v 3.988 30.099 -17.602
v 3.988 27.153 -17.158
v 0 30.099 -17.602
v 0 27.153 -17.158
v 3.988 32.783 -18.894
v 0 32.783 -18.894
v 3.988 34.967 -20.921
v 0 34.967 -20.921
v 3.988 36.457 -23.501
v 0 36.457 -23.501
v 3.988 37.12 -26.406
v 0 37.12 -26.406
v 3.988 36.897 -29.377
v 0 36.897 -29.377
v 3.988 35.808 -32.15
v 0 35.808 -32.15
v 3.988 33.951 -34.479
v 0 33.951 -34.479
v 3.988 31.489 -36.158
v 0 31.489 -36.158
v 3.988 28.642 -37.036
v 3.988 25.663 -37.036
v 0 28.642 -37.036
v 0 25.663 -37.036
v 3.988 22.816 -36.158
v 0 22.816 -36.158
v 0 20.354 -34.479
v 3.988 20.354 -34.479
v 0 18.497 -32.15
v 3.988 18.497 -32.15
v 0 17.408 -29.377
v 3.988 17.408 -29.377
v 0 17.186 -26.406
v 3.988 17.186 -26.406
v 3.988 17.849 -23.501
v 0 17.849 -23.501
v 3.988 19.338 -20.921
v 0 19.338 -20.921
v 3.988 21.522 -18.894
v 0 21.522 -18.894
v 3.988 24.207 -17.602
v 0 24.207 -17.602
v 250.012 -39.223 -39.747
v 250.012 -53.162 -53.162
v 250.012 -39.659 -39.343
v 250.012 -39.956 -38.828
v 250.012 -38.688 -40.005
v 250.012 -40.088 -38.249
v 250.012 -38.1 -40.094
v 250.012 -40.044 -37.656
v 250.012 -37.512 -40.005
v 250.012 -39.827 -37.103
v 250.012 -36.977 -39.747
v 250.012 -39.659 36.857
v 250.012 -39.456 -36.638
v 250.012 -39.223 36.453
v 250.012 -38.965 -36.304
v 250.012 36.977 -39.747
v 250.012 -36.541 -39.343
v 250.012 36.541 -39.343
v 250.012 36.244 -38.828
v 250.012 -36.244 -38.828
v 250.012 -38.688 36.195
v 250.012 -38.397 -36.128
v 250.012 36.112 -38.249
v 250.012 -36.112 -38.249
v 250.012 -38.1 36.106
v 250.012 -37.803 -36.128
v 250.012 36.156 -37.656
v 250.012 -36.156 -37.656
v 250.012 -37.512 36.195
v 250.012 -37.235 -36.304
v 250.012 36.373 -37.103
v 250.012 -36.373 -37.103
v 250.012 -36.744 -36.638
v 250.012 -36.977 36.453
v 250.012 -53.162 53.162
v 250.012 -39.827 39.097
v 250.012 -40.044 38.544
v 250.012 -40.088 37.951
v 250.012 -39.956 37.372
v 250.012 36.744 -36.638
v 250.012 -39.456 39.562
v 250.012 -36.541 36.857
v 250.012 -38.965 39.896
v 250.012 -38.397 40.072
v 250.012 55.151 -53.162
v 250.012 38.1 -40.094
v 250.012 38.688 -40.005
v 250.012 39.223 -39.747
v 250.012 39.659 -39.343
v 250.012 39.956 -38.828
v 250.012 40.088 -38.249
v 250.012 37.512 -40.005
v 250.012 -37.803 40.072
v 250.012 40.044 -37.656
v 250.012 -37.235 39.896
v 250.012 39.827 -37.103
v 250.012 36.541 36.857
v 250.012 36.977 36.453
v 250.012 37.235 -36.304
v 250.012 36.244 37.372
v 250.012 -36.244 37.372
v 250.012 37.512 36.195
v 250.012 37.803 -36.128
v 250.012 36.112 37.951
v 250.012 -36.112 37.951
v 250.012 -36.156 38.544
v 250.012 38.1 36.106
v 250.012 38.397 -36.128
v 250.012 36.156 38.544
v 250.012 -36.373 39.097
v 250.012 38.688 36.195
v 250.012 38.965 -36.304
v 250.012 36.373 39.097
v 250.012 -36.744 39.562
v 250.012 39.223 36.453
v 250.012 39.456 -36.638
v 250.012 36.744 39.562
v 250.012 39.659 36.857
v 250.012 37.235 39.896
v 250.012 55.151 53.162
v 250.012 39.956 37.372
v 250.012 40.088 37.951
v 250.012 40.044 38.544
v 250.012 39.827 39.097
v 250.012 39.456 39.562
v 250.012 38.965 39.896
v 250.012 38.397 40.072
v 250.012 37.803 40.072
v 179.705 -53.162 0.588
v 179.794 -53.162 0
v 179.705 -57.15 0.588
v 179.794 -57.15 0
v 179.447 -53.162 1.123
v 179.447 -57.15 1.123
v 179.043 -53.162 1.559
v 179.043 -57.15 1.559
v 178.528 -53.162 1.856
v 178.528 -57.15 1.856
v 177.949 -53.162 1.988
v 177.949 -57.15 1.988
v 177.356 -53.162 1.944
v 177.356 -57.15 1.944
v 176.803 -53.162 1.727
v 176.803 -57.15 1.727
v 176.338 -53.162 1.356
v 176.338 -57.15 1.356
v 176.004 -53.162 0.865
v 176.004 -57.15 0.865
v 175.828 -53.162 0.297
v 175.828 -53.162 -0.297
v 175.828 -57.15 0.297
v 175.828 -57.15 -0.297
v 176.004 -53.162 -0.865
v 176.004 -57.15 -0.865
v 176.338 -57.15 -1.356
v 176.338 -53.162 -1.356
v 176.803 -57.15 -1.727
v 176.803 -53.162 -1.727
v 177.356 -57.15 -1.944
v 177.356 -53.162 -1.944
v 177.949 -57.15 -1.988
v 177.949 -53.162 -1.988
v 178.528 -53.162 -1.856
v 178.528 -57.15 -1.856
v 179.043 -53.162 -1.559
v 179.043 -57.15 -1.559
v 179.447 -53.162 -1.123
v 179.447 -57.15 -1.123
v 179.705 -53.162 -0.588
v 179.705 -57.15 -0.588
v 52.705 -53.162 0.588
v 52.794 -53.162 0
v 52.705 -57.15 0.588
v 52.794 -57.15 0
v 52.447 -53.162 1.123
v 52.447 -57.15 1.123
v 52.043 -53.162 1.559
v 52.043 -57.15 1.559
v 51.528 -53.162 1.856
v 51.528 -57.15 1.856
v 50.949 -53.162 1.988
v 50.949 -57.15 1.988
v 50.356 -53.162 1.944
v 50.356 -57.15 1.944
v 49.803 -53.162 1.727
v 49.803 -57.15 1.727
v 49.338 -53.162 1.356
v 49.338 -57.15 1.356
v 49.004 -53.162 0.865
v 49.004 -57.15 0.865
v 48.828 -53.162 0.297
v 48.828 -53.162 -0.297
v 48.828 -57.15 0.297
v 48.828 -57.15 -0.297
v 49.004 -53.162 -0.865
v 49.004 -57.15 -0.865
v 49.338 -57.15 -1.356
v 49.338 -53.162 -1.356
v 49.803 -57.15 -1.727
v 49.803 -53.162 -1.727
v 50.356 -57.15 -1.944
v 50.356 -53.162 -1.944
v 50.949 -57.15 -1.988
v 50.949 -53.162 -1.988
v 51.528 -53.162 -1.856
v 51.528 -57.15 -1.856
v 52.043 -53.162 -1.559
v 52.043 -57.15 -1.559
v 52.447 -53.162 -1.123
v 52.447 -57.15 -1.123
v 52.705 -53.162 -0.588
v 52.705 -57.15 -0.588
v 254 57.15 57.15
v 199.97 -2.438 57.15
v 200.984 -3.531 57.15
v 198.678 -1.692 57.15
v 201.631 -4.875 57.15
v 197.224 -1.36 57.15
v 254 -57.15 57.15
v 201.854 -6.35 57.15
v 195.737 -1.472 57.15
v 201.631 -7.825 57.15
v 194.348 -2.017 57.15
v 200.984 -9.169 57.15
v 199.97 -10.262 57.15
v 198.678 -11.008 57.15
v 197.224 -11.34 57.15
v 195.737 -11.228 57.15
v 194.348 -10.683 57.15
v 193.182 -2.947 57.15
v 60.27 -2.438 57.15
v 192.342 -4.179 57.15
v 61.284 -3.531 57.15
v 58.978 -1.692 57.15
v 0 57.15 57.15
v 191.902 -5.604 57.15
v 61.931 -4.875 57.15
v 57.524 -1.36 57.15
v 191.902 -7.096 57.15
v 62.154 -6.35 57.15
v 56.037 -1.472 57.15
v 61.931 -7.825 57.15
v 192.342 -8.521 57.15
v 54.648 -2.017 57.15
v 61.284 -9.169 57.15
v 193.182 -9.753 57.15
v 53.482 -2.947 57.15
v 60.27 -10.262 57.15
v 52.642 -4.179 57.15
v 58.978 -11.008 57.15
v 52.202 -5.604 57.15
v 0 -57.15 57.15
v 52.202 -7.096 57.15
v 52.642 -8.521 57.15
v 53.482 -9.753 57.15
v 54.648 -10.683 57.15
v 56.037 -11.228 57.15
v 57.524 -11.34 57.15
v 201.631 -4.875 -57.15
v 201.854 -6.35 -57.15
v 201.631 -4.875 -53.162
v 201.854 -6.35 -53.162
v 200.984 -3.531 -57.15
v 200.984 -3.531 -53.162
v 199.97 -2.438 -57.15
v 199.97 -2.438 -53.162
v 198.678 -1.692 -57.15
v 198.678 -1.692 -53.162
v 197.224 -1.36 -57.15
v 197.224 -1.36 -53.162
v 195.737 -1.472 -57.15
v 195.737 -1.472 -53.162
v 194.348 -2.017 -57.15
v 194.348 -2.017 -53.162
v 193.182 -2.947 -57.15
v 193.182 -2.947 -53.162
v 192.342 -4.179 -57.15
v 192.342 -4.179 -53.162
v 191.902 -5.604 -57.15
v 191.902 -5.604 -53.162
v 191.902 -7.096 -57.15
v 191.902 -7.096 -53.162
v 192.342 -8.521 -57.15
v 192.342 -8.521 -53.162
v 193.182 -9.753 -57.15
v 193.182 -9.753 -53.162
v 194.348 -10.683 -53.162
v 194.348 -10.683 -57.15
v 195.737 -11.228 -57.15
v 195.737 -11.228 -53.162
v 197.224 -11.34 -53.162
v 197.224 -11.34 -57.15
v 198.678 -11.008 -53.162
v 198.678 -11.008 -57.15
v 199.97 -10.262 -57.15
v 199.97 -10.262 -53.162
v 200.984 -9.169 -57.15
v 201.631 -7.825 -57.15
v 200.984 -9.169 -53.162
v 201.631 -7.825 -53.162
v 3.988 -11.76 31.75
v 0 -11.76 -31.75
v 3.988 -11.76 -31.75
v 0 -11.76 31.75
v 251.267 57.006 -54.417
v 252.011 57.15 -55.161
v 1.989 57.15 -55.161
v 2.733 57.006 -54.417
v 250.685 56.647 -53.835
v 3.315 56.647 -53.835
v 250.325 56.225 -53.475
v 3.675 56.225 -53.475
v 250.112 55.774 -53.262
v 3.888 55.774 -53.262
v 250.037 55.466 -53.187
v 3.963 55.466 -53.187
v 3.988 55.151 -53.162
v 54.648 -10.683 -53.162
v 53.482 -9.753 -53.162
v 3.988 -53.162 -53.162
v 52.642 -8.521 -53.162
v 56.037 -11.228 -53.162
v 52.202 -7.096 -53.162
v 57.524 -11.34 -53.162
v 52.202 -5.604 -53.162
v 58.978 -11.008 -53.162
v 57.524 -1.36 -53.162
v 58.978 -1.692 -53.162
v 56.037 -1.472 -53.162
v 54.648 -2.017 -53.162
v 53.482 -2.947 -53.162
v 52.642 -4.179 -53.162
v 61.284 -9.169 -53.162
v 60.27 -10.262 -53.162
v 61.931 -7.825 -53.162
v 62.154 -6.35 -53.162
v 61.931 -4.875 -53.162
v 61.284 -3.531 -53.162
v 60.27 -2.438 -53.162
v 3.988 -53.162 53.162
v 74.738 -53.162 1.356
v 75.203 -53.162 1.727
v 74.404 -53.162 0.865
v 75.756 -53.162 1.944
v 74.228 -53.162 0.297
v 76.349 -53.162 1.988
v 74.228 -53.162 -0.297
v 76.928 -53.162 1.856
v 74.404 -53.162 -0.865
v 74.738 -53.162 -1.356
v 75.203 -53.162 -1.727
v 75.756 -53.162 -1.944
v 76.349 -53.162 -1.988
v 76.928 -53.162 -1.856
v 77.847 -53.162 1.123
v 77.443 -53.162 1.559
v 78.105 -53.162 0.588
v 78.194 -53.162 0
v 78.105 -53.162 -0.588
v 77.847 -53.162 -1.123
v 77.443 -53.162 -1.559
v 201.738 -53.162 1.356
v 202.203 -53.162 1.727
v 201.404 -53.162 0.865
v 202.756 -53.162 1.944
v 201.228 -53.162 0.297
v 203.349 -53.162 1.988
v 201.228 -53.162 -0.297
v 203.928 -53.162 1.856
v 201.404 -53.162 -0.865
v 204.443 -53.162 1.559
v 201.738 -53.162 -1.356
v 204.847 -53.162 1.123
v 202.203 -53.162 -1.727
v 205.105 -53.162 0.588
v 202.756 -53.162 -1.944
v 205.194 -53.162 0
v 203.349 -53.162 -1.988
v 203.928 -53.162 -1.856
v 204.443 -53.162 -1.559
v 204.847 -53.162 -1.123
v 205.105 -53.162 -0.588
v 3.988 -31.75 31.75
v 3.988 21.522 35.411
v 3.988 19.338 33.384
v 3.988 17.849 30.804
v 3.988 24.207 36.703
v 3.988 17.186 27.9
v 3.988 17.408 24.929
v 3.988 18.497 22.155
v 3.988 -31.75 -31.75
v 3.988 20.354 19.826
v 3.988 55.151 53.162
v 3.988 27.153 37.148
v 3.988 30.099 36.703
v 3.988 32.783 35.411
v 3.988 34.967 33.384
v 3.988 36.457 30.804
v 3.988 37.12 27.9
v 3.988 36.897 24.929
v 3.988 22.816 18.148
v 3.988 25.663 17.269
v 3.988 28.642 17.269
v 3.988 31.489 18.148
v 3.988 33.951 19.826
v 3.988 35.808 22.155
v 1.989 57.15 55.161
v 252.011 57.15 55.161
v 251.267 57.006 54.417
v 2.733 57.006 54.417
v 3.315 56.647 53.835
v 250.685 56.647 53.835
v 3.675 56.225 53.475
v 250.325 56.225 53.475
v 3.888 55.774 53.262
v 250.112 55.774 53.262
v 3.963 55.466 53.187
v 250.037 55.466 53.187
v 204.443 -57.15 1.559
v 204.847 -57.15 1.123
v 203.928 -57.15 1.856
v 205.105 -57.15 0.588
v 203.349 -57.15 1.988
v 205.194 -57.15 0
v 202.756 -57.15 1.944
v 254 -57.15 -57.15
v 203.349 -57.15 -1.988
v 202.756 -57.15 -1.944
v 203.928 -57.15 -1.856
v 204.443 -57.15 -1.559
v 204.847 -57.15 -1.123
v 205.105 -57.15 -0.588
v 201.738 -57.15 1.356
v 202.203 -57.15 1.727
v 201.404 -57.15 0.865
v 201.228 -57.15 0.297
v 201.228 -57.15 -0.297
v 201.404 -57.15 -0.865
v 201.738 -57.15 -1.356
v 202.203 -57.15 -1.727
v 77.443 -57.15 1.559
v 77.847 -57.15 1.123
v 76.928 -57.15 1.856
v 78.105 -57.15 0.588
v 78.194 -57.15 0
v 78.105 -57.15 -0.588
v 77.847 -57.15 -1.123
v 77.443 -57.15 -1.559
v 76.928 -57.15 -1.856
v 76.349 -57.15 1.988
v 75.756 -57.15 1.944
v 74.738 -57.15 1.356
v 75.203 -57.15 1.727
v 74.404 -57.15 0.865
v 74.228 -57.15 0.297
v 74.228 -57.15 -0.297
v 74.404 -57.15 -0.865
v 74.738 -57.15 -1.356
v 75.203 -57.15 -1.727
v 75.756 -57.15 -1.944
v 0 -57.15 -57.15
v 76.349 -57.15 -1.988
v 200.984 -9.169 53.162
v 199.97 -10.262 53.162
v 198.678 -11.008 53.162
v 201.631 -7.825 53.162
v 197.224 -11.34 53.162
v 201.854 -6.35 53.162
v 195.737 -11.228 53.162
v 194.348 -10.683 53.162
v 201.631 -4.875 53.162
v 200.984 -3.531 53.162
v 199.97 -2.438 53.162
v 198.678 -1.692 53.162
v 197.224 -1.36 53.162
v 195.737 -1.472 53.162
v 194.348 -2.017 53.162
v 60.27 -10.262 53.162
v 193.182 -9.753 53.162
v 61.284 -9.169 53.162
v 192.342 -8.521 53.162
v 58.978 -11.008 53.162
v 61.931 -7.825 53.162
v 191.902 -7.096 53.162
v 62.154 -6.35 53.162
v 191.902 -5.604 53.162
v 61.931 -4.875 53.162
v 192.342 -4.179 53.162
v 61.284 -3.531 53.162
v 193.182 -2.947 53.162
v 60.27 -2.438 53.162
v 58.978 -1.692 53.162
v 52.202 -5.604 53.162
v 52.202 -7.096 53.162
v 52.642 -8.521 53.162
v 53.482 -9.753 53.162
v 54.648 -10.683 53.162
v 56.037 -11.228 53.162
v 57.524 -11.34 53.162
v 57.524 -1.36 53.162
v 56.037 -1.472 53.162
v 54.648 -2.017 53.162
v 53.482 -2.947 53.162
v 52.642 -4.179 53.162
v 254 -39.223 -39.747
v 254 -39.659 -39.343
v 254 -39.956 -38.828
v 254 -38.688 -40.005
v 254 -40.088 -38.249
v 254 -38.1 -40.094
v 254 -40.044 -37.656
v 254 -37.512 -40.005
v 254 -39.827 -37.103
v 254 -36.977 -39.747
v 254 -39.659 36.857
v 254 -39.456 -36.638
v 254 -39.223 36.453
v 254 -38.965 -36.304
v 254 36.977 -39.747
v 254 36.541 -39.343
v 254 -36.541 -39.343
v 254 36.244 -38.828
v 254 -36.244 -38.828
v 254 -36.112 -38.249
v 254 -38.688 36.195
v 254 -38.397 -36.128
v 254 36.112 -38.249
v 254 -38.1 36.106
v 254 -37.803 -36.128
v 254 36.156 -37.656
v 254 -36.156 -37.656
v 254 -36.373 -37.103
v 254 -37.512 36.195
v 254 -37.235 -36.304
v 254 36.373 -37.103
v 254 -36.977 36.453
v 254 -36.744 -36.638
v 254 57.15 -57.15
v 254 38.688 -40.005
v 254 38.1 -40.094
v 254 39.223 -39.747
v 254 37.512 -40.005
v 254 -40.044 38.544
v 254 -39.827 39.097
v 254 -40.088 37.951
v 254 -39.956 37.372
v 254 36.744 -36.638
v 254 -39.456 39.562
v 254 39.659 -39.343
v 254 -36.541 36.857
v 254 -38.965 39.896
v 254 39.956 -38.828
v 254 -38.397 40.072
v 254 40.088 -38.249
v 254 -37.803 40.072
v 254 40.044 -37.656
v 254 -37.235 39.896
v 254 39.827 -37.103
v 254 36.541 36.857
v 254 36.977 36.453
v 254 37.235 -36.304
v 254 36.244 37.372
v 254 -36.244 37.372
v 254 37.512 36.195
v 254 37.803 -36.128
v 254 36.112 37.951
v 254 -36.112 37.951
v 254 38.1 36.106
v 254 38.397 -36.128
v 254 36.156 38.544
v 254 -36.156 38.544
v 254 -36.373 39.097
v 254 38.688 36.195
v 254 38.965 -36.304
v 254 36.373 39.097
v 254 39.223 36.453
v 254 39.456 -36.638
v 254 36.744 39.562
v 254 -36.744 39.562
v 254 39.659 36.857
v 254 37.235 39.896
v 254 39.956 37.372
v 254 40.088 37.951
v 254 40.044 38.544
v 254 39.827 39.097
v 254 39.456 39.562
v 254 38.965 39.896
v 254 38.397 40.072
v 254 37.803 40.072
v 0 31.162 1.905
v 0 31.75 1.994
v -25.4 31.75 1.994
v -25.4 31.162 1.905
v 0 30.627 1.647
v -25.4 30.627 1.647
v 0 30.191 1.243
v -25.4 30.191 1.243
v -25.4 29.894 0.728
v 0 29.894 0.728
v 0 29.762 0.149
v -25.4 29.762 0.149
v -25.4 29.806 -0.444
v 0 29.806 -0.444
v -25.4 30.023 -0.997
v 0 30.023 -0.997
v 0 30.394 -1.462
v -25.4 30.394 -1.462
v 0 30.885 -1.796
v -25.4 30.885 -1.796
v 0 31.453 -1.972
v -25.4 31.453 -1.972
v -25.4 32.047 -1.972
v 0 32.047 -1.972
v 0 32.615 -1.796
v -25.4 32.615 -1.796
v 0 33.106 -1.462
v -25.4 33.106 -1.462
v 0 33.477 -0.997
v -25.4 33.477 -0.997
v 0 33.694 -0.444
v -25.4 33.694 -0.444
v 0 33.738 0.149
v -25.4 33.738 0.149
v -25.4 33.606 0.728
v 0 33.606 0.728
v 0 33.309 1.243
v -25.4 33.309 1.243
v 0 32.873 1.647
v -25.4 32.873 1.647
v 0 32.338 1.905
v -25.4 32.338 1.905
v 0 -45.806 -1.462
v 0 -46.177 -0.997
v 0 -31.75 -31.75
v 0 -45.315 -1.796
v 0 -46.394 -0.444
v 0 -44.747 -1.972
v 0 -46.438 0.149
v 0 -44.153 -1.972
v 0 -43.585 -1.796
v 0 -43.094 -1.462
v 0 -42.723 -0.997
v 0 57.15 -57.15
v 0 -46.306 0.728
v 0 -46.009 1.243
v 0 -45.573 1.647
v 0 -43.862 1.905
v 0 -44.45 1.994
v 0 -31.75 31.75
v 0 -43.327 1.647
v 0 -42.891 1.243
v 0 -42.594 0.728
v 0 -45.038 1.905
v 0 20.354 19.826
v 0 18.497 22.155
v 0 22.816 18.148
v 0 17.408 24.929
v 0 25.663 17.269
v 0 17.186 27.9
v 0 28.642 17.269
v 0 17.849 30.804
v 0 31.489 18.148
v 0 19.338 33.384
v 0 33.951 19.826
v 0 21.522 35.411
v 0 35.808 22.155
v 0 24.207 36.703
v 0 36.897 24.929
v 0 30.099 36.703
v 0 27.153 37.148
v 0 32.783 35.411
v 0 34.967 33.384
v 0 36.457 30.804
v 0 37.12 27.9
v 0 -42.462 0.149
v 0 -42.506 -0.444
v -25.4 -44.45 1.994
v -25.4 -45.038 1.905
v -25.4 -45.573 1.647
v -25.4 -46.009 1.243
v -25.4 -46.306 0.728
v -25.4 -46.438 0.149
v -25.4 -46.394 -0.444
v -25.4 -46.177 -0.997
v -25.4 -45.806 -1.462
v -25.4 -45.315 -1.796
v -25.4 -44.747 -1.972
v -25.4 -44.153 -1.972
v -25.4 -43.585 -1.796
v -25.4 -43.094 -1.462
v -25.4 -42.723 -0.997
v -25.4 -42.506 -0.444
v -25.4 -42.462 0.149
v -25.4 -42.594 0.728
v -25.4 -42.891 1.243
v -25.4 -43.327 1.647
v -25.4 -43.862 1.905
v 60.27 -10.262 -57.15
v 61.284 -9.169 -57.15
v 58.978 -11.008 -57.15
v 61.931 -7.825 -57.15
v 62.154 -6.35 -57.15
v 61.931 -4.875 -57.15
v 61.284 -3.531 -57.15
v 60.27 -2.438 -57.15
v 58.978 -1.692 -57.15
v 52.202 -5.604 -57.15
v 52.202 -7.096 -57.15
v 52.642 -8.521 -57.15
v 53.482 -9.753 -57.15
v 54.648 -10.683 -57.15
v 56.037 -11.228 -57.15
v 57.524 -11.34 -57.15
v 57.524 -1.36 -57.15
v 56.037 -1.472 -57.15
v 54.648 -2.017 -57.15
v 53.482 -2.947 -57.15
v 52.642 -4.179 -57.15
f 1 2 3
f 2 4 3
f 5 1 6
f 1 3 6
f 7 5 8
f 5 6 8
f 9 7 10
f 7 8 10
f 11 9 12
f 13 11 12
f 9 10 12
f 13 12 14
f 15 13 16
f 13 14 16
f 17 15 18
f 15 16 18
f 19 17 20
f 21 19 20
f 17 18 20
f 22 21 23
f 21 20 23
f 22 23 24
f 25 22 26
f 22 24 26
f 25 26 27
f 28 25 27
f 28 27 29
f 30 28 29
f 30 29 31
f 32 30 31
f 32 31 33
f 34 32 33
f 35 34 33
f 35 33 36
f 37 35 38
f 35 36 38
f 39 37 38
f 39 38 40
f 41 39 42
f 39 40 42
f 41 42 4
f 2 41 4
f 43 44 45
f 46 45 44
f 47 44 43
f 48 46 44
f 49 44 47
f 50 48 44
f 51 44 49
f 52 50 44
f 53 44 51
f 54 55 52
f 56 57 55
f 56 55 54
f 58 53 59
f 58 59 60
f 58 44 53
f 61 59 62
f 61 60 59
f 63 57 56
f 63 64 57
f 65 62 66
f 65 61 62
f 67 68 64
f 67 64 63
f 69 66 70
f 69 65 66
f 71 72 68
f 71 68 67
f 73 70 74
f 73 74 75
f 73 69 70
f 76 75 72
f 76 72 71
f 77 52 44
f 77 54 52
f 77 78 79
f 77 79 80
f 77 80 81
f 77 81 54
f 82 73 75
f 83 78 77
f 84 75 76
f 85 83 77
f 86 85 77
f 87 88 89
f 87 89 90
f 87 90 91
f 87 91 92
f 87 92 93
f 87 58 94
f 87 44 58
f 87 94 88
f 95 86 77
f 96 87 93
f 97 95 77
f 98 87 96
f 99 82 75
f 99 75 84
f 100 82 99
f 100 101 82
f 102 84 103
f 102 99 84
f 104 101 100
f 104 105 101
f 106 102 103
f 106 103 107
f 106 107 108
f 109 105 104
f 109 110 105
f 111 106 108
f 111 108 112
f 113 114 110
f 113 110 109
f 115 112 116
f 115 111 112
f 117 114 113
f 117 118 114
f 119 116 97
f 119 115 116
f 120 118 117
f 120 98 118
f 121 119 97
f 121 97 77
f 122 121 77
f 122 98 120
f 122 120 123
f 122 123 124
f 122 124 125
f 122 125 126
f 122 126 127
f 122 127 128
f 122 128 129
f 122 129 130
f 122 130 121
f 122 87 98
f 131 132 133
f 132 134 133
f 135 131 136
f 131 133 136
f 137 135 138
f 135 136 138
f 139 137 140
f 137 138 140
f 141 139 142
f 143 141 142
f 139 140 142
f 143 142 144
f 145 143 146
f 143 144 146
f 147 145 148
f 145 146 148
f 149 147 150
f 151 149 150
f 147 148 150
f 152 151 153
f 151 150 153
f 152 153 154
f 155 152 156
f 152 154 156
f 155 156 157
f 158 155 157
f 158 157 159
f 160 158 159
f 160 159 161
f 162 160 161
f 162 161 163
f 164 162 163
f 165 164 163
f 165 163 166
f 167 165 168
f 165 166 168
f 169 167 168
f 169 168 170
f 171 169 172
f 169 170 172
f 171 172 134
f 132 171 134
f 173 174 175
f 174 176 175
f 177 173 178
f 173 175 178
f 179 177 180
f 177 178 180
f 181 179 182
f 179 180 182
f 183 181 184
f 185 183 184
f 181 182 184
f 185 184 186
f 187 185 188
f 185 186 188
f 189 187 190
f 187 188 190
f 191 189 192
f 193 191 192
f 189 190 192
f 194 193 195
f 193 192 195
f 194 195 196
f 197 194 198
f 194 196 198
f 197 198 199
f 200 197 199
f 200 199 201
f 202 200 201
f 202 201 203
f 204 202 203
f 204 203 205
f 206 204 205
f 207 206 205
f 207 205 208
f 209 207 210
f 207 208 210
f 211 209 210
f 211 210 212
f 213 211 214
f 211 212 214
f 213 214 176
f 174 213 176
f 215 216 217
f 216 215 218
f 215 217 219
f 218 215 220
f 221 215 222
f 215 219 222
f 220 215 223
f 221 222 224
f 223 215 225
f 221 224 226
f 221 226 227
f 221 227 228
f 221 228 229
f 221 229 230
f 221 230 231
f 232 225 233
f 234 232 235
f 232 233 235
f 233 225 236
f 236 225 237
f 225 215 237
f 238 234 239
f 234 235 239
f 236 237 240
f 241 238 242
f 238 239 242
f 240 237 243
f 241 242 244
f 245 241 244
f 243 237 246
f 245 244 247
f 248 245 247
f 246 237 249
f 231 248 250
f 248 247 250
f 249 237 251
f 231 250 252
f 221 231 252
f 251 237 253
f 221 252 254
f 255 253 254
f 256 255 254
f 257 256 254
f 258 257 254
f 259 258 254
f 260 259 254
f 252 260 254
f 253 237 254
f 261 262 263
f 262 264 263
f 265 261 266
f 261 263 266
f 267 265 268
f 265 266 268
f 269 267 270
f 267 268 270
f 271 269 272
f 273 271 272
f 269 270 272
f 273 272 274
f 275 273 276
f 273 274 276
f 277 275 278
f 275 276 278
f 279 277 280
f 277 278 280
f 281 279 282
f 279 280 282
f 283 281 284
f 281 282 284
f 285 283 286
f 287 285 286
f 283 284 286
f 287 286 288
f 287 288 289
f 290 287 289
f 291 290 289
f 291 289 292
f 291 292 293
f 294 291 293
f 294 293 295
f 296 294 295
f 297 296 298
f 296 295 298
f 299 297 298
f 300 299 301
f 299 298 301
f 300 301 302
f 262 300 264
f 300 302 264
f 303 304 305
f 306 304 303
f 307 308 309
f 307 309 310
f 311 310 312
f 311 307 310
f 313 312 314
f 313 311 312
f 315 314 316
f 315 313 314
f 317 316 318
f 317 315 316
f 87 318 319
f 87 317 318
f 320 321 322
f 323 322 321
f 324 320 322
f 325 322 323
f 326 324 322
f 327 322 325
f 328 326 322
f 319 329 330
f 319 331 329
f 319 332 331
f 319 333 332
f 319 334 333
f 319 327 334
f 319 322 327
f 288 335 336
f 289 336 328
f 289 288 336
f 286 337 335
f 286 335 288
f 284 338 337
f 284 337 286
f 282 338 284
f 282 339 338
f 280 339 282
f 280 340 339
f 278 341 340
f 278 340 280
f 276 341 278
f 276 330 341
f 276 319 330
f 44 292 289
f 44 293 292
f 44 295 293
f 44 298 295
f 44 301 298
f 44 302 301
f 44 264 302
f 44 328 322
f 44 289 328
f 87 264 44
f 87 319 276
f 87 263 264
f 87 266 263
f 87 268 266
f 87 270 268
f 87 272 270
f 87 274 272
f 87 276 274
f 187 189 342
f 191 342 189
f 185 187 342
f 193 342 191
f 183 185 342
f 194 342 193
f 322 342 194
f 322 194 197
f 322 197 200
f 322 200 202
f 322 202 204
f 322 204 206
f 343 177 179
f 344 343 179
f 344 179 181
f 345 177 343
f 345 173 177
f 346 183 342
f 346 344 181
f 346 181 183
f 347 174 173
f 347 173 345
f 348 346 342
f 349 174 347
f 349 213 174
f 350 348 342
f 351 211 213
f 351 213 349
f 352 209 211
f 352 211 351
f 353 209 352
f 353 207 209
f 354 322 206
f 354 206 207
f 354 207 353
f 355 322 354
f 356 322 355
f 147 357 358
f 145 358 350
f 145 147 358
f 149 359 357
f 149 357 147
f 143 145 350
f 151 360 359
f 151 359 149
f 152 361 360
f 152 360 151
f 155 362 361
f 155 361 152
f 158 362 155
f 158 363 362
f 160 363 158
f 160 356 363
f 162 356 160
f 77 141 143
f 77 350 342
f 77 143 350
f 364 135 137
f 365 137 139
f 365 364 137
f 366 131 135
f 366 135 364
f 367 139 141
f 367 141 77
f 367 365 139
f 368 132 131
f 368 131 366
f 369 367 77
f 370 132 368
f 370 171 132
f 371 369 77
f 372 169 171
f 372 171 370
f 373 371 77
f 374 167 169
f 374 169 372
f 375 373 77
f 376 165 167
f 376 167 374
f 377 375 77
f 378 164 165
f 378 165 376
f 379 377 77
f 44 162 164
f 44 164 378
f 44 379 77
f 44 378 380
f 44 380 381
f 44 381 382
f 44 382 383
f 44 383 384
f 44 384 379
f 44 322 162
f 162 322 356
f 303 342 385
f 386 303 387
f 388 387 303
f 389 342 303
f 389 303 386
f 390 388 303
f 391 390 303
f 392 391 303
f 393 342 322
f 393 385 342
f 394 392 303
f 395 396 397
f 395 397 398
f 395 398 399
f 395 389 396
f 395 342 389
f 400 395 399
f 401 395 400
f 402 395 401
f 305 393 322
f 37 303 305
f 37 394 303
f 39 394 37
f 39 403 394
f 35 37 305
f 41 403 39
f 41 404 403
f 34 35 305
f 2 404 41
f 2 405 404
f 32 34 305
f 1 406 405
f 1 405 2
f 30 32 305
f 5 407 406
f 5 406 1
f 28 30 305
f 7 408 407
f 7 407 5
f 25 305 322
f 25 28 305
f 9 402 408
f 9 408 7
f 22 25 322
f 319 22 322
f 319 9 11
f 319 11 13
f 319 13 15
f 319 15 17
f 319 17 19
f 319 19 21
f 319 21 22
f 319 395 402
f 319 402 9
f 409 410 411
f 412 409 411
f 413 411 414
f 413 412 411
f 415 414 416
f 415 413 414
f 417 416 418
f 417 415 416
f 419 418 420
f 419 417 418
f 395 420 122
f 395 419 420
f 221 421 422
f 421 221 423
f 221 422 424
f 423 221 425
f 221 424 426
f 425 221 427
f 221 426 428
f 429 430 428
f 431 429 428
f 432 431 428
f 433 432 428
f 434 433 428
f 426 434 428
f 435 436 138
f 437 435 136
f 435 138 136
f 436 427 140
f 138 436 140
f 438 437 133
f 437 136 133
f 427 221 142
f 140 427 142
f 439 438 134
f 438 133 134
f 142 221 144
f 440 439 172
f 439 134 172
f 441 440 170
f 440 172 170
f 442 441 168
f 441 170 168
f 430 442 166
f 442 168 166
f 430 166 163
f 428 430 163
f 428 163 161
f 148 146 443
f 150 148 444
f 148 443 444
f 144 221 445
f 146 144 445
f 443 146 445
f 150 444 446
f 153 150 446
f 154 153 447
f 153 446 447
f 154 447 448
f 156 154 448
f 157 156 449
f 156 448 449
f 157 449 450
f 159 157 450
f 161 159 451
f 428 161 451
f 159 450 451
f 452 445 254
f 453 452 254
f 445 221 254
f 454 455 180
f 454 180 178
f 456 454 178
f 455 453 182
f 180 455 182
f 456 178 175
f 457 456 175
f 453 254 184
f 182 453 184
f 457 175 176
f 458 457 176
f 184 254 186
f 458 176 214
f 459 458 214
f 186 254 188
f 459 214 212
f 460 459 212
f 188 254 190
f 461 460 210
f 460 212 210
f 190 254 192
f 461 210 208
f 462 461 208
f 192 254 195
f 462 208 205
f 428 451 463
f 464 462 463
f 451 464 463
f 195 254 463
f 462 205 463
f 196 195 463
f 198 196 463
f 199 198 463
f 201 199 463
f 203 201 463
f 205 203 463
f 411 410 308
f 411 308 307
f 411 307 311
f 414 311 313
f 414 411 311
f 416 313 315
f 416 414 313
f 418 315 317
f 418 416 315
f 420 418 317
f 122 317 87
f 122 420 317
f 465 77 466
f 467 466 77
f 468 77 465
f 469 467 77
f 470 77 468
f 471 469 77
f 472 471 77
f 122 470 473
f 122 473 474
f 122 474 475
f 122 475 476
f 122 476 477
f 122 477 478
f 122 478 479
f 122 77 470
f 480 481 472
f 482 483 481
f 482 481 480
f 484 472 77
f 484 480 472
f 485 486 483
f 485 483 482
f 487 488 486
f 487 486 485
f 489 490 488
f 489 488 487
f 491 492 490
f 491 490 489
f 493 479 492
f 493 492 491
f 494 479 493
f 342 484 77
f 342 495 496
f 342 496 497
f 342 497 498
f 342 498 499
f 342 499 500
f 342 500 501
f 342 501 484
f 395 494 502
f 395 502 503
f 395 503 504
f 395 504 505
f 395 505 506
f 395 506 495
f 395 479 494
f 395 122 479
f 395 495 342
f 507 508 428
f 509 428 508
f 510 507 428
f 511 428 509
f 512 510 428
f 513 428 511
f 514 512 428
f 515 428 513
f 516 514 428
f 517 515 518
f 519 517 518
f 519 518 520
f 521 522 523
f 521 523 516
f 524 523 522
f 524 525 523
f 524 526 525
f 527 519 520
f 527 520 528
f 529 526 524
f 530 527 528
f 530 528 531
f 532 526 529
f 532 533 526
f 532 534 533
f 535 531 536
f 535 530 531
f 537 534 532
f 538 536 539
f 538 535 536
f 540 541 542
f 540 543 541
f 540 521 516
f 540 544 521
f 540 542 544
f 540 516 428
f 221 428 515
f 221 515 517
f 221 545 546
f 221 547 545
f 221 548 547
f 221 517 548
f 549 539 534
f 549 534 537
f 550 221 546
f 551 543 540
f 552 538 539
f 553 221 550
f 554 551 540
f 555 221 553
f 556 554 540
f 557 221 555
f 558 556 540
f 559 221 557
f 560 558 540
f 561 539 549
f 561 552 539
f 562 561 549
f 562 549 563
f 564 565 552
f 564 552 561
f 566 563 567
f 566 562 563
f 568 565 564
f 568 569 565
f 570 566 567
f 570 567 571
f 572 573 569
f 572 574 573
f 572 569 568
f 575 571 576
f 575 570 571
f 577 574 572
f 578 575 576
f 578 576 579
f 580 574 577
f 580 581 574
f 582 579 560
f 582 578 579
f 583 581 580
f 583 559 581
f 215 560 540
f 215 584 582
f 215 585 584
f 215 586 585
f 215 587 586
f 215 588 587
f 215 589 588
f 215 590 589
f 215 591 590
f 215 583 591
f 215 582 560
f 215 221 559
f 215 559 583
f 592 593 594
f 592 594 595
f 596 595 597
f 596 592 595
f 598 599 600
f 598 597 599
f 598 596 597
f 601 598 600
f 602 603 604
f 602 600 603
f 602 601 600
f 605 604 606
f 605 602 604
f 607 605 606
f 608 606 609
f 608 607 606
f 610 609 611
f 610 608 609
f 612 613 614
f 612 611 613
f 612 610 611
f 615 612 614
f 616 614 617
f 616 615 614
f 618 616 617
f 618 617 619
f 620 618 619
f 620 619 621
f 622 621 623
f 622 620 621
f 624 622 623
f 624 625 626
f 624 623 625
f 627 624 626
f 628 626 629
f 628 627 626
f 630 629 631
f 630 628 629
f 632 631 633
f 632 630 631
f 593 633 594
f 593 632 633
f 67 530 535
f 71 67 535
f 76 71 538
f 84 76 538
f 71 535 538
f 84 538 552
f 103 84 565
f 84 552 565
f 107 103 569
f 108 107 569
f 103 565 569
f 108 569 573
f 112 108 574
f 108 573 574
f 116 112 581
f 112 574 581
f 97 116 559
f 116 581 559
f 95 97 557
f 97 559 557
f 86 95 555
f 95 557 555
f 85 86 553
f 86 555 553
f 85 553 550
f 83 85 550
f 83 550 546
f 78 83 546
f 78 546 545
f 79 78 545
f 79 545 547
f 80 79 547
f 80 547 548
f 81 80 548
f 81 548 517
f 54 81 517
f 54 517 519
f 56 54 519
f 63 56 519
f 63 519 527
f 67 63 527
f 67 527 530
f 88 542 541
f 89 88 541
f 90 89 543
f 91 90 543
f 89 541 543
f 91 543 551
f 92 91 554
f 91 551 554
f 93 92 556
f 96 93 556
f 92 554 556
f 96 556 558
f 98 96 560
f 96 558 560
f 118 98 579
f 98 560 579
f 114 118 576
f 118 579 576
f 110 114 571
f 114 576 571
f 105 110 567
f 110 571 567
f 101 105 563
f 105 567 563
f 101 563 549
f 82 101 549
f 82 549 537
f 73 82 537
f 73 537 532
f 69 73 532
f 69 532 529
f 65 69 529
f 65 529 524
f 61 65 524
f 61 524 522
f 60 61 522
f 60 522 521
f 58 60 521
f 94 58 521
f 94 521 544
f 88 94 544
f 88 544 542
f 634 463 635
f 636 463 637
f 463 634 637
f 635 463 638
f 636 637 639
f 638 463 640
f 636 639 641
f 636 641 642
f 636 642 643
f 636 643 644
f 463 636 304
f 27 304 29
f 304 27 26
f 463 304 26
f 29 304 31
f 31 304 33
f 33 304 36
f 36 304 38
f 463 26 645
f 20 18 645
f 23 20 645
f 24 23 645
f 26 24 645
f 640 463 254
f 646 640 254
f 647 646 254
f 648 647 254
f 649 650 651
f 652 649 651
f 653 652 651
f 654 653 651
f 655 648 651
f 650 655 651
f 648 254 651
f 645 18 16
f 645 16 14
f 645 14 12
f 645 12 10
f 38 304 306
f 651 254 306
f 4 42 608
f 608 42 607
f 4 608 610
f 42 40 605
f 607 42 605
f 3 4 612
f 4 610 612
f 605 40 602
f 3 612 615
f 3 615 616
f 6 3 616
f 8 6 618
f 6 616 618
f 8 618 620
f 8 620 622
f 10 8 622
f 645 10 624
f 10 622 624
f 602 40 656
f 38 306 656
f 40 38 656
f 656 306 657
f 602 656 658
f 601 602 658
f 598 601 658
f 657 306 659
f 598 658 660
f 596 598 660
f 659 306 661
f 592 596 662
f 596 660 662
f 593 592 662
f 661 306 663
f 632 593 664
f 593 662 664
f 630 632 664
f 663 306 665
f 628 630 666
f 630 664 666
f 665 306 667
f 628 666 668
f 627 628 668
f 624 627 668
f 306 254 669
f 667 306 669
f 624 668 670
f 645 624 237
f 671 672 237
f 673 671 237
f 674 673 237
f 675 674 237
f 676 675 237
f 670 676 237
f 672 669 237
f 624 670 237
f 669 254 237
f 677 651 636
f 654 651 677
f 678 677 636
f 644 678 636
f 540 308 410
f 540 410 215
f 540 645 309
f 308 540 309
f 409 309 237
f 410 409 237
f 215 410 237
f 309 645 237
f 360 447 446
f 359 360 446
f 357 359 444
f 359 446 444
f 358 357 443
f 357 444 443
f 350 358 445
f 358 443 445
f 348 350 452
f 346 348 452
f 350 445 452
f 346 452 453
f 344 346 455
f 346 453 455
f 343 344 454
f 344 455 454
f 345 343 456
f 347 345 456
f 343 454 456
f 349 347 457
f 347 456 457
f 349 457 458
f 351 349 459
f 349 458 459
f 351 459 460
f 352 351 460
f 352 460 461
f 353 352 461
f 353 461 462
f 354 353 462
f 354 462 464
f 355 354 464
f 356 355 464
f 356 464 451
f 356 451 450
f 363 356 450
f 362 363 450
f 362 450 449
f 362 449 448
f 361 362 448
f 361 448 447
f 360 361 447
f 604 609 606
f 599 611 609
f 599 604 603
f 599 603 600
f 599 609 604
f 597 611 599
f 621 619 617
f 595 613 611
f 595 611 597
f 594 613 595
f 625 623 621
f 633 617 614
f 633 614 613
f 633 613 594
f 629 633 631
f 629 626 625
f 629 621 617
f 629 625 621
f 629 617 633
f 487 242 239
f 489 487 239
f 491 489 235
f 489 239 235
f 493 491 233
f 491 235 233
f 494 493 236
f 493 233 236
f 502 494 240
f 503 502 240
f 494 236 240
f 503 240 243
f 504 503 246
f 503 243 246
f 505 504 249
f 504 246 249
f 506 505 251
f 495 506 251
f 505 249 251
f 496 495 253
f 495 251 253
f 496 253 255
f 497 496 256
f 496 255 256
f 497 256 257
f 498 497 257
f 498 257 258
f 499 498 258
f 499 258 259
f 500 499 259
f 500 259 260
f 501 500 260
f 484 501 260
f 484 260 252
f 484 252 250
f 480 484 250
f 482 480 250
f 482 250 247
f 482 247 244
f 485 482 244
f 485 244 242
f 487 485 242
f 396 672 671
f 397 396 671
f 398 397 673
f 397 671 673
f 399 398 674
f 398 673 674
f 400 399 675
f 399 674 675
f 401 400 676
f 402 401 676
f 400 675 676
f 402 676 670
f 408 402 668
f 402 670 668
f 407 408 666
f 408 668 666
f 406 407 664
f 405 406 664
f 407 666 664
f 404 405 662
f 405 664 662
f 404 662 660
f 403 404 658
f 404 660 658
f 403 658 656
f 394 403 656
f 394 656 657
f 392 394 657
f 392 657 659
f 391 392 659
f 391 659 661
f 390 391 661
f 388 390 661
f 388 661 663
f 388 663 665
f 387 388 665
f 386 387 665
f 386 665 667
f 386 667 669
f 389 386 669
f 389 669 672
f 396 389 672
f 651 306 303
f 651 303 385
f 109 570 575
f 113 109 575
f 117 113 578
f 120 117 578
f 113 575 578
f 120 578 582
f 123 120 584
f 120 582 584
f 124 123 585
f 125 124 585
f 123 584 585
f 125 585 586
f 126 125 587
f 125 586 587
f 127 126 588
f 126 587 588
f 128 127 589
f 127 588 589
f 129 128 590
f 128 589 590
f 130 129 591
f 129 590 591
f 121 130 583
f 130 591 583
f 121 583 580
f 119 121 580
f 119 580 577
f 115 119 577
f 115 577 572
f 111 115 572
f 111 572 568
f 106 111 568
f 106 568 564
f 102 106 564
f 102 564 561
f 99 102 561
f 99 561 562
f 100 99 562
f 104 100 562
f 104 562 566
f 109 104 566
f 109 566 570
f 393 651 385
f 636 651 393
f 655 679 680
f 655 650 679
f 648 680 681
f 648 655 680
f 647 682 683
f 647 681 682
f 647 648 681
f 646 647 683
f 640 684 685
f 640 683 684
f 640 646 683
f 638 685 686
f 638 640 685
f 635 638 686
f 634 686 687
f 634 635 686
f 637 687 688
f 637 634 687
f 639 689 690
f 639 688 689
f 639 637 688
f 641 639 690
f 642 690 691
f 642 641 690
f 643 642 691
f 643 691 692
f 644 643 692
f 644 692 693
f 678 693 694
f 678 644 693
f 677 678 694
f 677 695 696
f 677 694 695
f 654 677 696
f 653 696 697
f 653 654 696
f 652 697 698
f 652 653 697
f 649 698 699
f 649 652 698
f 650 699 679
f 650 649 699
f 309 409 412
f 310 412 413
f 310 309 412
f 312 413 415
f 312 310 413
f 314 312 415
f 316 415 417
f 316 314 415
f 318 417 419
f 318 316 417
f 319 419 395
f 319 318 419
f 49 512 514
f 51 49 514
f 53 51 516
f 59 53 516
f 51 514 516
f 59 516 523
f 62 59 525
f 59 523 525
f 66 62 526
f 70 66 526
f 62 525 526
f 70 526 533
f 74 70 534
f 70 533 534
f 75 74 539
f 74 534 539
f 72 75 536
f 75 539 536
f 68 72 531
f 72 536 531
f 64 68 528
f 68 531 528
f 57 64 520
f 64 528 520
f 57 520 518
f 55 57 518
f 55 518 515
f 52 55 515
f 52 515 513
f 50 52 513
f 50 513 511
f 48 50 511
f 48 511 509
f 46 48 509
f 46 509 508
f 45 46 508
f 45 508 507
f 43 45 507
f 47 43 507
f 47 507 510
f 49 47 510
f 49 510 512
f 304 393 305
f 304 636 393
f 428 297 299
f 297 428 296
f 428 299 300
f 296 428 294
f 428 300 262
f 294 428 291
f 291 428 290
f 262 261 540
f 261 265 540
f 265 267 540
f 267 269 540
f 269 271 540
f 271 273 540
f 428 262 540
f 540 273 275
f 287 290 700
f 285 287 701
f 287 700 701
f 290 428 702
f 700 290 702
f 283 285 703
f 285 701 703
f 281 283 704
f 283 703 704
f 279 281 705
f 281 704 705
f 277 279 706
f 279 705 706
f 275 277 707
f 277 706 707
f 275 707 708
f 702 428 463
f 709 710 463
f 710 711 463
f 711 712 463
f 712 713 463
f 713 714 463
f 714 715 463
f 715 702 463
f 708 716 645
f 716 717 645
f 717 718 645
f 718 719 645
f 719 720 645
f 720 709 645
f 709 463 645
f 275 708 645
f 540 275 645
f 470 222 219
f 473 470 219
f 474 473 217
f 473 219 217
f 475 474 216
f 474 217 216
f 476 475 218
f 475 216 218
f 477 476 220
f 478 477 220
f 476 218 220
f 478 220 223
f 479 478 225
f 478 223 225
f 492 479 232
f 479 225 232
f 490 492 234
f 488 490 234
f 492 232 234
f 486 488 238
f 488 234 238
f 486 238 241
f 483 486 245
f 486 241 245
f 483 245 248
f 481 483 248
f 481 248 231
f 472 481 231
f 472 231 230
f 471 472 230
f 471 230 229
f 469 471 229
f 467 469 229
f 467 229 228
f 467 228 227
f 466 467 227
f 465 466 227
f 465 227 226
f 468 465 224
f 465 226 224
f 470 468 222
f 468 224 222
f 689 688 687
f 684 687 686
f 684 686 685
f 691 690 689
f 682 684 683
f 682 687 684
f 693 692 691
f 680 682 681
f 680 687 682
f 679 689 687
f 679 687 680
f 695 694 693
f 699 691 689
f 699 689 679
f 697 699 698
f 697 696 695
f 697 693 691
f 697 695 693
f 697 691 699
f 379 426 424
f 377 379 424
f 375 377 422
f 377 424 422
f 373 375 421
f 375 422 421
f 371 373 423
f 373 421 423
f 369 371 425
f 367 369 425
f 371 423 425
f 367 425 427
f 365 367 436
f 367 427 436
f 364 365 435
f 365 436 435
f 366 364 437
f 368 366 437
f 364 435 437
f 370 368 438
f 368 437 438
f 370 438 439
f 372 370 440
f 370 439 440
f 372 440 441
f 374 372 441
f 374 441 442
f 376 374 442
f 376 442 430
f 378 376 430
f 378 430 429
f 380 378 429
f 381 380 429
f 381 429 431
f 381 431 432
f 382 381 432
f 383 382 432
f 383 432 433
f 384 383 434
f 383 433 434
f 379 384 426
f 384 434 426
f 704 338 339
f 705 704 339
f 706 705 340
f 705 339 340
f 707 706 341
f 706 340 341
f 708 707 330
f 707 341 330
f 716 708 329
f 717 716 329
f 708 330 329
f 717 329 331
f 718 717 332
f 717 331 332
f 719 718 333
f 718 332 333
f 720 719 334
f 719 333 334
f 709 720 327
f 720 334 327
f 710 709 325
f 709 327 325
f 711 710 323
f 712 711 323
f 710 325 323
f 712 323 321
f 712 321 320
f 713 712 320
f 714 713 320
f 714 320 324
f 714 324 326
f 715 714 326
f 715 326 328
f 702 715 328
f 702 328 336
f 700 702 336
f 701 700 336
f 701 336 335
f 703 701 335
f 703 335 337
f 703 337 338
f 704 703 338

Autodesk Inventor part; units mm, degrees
ref_plane "YZ Plane" through (0, 0, 0) normal (1, 0, 0) x (0, 1, 0)
ref_plane "XZ Plane" through (0, 0, 0) normal (0, 1, 0) x (-1, 0, 0)
ref_plane "XY Plane" through (0, 0, 0) normal (0, 0, 1) x (1, 0, 0)
sketch "Sketch1" plane through (0, 0, 0) normal (1, 0, 0) x (0, 1, 0)
  point P0 (0, 0)
sketch "Sketch2" plane through (0, 0, 0) normal (1, 0, 0) x (0, 1, 0)
  line L0 (57.15, 57.15) -> (-57.15, 57.15)
  line L1 (-57.15, 57.15) -> (-57.15, -57.15)
  line L2 (-57.15, -57.15) -> (57.15, -57.15)
  line L3 (57.15, -57.15) -> (57.15, 57.15)
  line L4 (57.15, 57.15) -> (-57.15, -57.15) construction
  line L5 (-57.15, 57.15) -> (57.15, -57.15) construction
  point P0 (0, 0)
  dimension "d0" = 114.3
  dimension "d1" = 114.3
extrude "Extrusion1" add sketch "Sketch2" along normal blind 254
sketch "Sketch3" plane through (0, 57.15, 57.15) normal (0, 1, 0) x (1, 0, 0)
  line L0 (3.9878, 110.3122) -> (250.0122, 110.3122)
  line L1 (250.0122, 110.3122) -> (250.0122, 3.9878)
  line L2 (250.0122, 3.9878) -> (3.9878, 3.9878)
  line L3 (3.9878, 3.9878) -> (3.9878, 110.3122)
  line L4 (0, 114.3) -> (254, 114.3) projected
  line L5 (0, 114.3) -> (0, 0) projected
  line L6 (0, 0) -> (254, 0) projected
  line L7 (254, 114.3) -> (254, 0) projected
  point P0 (0, 57.15)
  dimension "d4" = 3.9878
  dimension "d5" = 3.9878
  dimension "d6" = 3.9878
  dimension "d7" = 3.9878
extrude "Extrusion2" cut sketch "Sketch3" against normal blind 110.3122 contours L0 L1 L2 L3
sketch "Sketch5" plane through (0, -57.15, 57.15) normal (0, 0, 1) x (1, 0, 0)
  circle A0 centre (57.15, 50.8) radius 5.0038
  circle A1 centre (196.85, 50.8) radius 5.0038
  line L0 (0, 0) -> (254, 0) projected
  line L1 (0, 114.3) -> (0, 0) projected
  line L2 (254, 114.3) -> (254, 0) projected
  point P0 (0, 57.15)
  dimension "d19" = 10.0076
  dimension "d20" = 10.0076
  dimension "d21" = 50.8
  dimension "d22" = 50.8
  dimension "d23" = 57.15
  dimension "d24" = 57.15
extrude "Extrusion3" cut sketch "Sketch5" against normal through all
sketch "Sketch6" plane through (0, -57.15, -57.15) normal (0, -1, 0) x (1, 0, 0)
  circle A0 centre (50.8, 57.15) radius 1.9939
  circle A1 centre (76.2, 57.15) radius 1.9939
  circle A2 centre (177.8, 57.15) radius 1.9939
  circle A3 centre (203.2, 57.15) radius 1.9939
  line L0 (0, 114.3) -> (254, 114.3) projected
  line L1 (0, 114.3) -> (0, 0) projected
  line L2 (254, 114.3) -> (254, 0) projected
  point P0 (0, 57.15)
  dimension "d27" = 3.9878
  dimension "d28" = 3.9878
  dimension "d29" = 3.9878
  dimension "d30" = 3.9878
  dimension "d31" = 57.15
  dimension "d32" = 57.15
  dimension "d33" = 57.15
  dimension "d34" = 57.15
  dimension "d35" = 50.8
  dimension "d36" = 50.8
  dimension "d37" = 76.2
  dimension "d38" = 76.2
extrude "Extrusion4" cut sketch "Sketch6" against normal through all
fillet "Fillet3" radius 1.999 4 edges at (250.0122, 57.15, 0) (127, 57.15, -53.1622) (127, 57.15, 53.1622) (3.9878, 57.15, 0)
sketch "Sketch7" plane through (0, 0, 0) normal (-1, 0, 0) x (0, 0, 1)
  circle A0 centre (-27.1526, 27.1526) radius 9.9949
  circle A1 centre (27.1526, 27.1526) radius 9.9949
  line L0 (-31.75, -11.7602) -> (31.75, -11.7602)
  line L1 (31.75, -11.7602) -> (31.75, -31.75)
  line L2 (31.75, -31.75) -> (-31.75, -31.75)
  line L3 (-31.75, -31.75) -> (-31.75, -11.7602)
  line L4 (57.15, -57.15) -> (-57.15, -57.15) projected
  line L5 (57.15, 57.15) -> (57.15, -57.15) projected
  line L6 (-57.15, 57.15) -> (57.15, 57.15) projected
  line L7 (-57.15, -57.15) -> (-57.15, 57.15) projected
  point P0 (0, 0)
  dimension "d43" = 19.9898
  dimension "d44" = 19.9898
  dimension "d45" = 63.5
  dimension "d46" = 19.9898
  dimension "d47" = 25.4
  dimension "d48" = 25.4
  dimension "d49" = 29.9974
  dimension "d50" = 29.9974
  dimension "d51" = 29.9974
  dimension "d52" = 29.9974
sketch "Sketch8" plane through (0, 0, 0) normal (-1, 0, 0) x (0, 0, 1)
  point P0 (0, 0)
extrude "Extrusion5" cut sketch "Sketch7" against normal blind 3.9878 contours A0 | A1 | L0 L1 L2 L3
sketch "Sketch9" plane through (254, 0, 0) normal (1, 0, 0) x (0, 0, -1)
  circle A0 centre (-38.1, 38.1) radius 1.9939
  circle A1 centre (38.1, 38.1) radius 1.9939
  circle A2 centre (-38.1, -38.1) radius 1.9939
  circle A3 centre (38.1, -38.1) radius 1.9939
  line L0 (57.15, 57.15) -> (-57.15, 57.15) projected
  line L1 (-57.15, 57.15) -> (-57.15, -57.15) projected
  line L2 (57.15, -57.15) -> (57.15, 57.15) projected
  line L3 (-57.15, -57.15) -> (57.15, -57.15) projected
  point P0 (0, 0)
  dimension "d55" = 3.9878
  dimension "d56" = 3.9878
  dimension "d57" = 3.9878
  dimension "d58" = 3.9878
  dimension "d59" = 19.05
  dimension "d60" = 19.05
  dimension "d61" = 19.05
  dimension "d62" = 19.05
  dimension "d63" = 19.05
  dimension "d64" = 19.05
  dimension "d65" = 19.05
  dimension "d66" = 19.05
sketch "Sketch10" plane through (254, 0, 0) normal (1, 0, 0) x (0, 0, -1)
  point P0 (0, 0)
extrude "Extrusion6" cut sketch "Sketch9" against normal blind 3.9878 contours A0 | A1 | A2 | A3
sketch "Sketch16" plane through (0, -57.15, 57.15) normal (0, 0, 1) x (1, 0, 0)
  point P0 (0, 57.15)
sketch "Sketch17" plane through (0, -57.15, 57.15) normal (0, 0, 1) x (1, 0, 0)
  point P0 (0, 57.15)
sketch "Sketch18" plane through (0, 0, 0) normal (-1, 0, 0) x (0, 0, 1)
  circle A0 centre (0, 31.75) radius 1.9939
  circle A1 centre (0, -44.45) radius 1.9939
  line L0 (-57.15, 57.15) -> (57.15, 57.15) projected
  line L1 (57.15, -57.15) -> (-57.15, -57.15) projected
  point P0 (0, 0)
  dimension "d89" = 3.9878
  dimension "d90" = 3.9878
  dimension "d91" = 25.4
  dimension "d92" = 12.7
extrude "Extrusion11" add sketch "Sketch18" along normal blind 25.4
sketch "Sketch19" plane through (0, 0, 0) normal (-1, 0, 0) x (0, 0, 1)
  point P0 (0, 0)
properties part number "pranshu part" material "PBT Plastic"
